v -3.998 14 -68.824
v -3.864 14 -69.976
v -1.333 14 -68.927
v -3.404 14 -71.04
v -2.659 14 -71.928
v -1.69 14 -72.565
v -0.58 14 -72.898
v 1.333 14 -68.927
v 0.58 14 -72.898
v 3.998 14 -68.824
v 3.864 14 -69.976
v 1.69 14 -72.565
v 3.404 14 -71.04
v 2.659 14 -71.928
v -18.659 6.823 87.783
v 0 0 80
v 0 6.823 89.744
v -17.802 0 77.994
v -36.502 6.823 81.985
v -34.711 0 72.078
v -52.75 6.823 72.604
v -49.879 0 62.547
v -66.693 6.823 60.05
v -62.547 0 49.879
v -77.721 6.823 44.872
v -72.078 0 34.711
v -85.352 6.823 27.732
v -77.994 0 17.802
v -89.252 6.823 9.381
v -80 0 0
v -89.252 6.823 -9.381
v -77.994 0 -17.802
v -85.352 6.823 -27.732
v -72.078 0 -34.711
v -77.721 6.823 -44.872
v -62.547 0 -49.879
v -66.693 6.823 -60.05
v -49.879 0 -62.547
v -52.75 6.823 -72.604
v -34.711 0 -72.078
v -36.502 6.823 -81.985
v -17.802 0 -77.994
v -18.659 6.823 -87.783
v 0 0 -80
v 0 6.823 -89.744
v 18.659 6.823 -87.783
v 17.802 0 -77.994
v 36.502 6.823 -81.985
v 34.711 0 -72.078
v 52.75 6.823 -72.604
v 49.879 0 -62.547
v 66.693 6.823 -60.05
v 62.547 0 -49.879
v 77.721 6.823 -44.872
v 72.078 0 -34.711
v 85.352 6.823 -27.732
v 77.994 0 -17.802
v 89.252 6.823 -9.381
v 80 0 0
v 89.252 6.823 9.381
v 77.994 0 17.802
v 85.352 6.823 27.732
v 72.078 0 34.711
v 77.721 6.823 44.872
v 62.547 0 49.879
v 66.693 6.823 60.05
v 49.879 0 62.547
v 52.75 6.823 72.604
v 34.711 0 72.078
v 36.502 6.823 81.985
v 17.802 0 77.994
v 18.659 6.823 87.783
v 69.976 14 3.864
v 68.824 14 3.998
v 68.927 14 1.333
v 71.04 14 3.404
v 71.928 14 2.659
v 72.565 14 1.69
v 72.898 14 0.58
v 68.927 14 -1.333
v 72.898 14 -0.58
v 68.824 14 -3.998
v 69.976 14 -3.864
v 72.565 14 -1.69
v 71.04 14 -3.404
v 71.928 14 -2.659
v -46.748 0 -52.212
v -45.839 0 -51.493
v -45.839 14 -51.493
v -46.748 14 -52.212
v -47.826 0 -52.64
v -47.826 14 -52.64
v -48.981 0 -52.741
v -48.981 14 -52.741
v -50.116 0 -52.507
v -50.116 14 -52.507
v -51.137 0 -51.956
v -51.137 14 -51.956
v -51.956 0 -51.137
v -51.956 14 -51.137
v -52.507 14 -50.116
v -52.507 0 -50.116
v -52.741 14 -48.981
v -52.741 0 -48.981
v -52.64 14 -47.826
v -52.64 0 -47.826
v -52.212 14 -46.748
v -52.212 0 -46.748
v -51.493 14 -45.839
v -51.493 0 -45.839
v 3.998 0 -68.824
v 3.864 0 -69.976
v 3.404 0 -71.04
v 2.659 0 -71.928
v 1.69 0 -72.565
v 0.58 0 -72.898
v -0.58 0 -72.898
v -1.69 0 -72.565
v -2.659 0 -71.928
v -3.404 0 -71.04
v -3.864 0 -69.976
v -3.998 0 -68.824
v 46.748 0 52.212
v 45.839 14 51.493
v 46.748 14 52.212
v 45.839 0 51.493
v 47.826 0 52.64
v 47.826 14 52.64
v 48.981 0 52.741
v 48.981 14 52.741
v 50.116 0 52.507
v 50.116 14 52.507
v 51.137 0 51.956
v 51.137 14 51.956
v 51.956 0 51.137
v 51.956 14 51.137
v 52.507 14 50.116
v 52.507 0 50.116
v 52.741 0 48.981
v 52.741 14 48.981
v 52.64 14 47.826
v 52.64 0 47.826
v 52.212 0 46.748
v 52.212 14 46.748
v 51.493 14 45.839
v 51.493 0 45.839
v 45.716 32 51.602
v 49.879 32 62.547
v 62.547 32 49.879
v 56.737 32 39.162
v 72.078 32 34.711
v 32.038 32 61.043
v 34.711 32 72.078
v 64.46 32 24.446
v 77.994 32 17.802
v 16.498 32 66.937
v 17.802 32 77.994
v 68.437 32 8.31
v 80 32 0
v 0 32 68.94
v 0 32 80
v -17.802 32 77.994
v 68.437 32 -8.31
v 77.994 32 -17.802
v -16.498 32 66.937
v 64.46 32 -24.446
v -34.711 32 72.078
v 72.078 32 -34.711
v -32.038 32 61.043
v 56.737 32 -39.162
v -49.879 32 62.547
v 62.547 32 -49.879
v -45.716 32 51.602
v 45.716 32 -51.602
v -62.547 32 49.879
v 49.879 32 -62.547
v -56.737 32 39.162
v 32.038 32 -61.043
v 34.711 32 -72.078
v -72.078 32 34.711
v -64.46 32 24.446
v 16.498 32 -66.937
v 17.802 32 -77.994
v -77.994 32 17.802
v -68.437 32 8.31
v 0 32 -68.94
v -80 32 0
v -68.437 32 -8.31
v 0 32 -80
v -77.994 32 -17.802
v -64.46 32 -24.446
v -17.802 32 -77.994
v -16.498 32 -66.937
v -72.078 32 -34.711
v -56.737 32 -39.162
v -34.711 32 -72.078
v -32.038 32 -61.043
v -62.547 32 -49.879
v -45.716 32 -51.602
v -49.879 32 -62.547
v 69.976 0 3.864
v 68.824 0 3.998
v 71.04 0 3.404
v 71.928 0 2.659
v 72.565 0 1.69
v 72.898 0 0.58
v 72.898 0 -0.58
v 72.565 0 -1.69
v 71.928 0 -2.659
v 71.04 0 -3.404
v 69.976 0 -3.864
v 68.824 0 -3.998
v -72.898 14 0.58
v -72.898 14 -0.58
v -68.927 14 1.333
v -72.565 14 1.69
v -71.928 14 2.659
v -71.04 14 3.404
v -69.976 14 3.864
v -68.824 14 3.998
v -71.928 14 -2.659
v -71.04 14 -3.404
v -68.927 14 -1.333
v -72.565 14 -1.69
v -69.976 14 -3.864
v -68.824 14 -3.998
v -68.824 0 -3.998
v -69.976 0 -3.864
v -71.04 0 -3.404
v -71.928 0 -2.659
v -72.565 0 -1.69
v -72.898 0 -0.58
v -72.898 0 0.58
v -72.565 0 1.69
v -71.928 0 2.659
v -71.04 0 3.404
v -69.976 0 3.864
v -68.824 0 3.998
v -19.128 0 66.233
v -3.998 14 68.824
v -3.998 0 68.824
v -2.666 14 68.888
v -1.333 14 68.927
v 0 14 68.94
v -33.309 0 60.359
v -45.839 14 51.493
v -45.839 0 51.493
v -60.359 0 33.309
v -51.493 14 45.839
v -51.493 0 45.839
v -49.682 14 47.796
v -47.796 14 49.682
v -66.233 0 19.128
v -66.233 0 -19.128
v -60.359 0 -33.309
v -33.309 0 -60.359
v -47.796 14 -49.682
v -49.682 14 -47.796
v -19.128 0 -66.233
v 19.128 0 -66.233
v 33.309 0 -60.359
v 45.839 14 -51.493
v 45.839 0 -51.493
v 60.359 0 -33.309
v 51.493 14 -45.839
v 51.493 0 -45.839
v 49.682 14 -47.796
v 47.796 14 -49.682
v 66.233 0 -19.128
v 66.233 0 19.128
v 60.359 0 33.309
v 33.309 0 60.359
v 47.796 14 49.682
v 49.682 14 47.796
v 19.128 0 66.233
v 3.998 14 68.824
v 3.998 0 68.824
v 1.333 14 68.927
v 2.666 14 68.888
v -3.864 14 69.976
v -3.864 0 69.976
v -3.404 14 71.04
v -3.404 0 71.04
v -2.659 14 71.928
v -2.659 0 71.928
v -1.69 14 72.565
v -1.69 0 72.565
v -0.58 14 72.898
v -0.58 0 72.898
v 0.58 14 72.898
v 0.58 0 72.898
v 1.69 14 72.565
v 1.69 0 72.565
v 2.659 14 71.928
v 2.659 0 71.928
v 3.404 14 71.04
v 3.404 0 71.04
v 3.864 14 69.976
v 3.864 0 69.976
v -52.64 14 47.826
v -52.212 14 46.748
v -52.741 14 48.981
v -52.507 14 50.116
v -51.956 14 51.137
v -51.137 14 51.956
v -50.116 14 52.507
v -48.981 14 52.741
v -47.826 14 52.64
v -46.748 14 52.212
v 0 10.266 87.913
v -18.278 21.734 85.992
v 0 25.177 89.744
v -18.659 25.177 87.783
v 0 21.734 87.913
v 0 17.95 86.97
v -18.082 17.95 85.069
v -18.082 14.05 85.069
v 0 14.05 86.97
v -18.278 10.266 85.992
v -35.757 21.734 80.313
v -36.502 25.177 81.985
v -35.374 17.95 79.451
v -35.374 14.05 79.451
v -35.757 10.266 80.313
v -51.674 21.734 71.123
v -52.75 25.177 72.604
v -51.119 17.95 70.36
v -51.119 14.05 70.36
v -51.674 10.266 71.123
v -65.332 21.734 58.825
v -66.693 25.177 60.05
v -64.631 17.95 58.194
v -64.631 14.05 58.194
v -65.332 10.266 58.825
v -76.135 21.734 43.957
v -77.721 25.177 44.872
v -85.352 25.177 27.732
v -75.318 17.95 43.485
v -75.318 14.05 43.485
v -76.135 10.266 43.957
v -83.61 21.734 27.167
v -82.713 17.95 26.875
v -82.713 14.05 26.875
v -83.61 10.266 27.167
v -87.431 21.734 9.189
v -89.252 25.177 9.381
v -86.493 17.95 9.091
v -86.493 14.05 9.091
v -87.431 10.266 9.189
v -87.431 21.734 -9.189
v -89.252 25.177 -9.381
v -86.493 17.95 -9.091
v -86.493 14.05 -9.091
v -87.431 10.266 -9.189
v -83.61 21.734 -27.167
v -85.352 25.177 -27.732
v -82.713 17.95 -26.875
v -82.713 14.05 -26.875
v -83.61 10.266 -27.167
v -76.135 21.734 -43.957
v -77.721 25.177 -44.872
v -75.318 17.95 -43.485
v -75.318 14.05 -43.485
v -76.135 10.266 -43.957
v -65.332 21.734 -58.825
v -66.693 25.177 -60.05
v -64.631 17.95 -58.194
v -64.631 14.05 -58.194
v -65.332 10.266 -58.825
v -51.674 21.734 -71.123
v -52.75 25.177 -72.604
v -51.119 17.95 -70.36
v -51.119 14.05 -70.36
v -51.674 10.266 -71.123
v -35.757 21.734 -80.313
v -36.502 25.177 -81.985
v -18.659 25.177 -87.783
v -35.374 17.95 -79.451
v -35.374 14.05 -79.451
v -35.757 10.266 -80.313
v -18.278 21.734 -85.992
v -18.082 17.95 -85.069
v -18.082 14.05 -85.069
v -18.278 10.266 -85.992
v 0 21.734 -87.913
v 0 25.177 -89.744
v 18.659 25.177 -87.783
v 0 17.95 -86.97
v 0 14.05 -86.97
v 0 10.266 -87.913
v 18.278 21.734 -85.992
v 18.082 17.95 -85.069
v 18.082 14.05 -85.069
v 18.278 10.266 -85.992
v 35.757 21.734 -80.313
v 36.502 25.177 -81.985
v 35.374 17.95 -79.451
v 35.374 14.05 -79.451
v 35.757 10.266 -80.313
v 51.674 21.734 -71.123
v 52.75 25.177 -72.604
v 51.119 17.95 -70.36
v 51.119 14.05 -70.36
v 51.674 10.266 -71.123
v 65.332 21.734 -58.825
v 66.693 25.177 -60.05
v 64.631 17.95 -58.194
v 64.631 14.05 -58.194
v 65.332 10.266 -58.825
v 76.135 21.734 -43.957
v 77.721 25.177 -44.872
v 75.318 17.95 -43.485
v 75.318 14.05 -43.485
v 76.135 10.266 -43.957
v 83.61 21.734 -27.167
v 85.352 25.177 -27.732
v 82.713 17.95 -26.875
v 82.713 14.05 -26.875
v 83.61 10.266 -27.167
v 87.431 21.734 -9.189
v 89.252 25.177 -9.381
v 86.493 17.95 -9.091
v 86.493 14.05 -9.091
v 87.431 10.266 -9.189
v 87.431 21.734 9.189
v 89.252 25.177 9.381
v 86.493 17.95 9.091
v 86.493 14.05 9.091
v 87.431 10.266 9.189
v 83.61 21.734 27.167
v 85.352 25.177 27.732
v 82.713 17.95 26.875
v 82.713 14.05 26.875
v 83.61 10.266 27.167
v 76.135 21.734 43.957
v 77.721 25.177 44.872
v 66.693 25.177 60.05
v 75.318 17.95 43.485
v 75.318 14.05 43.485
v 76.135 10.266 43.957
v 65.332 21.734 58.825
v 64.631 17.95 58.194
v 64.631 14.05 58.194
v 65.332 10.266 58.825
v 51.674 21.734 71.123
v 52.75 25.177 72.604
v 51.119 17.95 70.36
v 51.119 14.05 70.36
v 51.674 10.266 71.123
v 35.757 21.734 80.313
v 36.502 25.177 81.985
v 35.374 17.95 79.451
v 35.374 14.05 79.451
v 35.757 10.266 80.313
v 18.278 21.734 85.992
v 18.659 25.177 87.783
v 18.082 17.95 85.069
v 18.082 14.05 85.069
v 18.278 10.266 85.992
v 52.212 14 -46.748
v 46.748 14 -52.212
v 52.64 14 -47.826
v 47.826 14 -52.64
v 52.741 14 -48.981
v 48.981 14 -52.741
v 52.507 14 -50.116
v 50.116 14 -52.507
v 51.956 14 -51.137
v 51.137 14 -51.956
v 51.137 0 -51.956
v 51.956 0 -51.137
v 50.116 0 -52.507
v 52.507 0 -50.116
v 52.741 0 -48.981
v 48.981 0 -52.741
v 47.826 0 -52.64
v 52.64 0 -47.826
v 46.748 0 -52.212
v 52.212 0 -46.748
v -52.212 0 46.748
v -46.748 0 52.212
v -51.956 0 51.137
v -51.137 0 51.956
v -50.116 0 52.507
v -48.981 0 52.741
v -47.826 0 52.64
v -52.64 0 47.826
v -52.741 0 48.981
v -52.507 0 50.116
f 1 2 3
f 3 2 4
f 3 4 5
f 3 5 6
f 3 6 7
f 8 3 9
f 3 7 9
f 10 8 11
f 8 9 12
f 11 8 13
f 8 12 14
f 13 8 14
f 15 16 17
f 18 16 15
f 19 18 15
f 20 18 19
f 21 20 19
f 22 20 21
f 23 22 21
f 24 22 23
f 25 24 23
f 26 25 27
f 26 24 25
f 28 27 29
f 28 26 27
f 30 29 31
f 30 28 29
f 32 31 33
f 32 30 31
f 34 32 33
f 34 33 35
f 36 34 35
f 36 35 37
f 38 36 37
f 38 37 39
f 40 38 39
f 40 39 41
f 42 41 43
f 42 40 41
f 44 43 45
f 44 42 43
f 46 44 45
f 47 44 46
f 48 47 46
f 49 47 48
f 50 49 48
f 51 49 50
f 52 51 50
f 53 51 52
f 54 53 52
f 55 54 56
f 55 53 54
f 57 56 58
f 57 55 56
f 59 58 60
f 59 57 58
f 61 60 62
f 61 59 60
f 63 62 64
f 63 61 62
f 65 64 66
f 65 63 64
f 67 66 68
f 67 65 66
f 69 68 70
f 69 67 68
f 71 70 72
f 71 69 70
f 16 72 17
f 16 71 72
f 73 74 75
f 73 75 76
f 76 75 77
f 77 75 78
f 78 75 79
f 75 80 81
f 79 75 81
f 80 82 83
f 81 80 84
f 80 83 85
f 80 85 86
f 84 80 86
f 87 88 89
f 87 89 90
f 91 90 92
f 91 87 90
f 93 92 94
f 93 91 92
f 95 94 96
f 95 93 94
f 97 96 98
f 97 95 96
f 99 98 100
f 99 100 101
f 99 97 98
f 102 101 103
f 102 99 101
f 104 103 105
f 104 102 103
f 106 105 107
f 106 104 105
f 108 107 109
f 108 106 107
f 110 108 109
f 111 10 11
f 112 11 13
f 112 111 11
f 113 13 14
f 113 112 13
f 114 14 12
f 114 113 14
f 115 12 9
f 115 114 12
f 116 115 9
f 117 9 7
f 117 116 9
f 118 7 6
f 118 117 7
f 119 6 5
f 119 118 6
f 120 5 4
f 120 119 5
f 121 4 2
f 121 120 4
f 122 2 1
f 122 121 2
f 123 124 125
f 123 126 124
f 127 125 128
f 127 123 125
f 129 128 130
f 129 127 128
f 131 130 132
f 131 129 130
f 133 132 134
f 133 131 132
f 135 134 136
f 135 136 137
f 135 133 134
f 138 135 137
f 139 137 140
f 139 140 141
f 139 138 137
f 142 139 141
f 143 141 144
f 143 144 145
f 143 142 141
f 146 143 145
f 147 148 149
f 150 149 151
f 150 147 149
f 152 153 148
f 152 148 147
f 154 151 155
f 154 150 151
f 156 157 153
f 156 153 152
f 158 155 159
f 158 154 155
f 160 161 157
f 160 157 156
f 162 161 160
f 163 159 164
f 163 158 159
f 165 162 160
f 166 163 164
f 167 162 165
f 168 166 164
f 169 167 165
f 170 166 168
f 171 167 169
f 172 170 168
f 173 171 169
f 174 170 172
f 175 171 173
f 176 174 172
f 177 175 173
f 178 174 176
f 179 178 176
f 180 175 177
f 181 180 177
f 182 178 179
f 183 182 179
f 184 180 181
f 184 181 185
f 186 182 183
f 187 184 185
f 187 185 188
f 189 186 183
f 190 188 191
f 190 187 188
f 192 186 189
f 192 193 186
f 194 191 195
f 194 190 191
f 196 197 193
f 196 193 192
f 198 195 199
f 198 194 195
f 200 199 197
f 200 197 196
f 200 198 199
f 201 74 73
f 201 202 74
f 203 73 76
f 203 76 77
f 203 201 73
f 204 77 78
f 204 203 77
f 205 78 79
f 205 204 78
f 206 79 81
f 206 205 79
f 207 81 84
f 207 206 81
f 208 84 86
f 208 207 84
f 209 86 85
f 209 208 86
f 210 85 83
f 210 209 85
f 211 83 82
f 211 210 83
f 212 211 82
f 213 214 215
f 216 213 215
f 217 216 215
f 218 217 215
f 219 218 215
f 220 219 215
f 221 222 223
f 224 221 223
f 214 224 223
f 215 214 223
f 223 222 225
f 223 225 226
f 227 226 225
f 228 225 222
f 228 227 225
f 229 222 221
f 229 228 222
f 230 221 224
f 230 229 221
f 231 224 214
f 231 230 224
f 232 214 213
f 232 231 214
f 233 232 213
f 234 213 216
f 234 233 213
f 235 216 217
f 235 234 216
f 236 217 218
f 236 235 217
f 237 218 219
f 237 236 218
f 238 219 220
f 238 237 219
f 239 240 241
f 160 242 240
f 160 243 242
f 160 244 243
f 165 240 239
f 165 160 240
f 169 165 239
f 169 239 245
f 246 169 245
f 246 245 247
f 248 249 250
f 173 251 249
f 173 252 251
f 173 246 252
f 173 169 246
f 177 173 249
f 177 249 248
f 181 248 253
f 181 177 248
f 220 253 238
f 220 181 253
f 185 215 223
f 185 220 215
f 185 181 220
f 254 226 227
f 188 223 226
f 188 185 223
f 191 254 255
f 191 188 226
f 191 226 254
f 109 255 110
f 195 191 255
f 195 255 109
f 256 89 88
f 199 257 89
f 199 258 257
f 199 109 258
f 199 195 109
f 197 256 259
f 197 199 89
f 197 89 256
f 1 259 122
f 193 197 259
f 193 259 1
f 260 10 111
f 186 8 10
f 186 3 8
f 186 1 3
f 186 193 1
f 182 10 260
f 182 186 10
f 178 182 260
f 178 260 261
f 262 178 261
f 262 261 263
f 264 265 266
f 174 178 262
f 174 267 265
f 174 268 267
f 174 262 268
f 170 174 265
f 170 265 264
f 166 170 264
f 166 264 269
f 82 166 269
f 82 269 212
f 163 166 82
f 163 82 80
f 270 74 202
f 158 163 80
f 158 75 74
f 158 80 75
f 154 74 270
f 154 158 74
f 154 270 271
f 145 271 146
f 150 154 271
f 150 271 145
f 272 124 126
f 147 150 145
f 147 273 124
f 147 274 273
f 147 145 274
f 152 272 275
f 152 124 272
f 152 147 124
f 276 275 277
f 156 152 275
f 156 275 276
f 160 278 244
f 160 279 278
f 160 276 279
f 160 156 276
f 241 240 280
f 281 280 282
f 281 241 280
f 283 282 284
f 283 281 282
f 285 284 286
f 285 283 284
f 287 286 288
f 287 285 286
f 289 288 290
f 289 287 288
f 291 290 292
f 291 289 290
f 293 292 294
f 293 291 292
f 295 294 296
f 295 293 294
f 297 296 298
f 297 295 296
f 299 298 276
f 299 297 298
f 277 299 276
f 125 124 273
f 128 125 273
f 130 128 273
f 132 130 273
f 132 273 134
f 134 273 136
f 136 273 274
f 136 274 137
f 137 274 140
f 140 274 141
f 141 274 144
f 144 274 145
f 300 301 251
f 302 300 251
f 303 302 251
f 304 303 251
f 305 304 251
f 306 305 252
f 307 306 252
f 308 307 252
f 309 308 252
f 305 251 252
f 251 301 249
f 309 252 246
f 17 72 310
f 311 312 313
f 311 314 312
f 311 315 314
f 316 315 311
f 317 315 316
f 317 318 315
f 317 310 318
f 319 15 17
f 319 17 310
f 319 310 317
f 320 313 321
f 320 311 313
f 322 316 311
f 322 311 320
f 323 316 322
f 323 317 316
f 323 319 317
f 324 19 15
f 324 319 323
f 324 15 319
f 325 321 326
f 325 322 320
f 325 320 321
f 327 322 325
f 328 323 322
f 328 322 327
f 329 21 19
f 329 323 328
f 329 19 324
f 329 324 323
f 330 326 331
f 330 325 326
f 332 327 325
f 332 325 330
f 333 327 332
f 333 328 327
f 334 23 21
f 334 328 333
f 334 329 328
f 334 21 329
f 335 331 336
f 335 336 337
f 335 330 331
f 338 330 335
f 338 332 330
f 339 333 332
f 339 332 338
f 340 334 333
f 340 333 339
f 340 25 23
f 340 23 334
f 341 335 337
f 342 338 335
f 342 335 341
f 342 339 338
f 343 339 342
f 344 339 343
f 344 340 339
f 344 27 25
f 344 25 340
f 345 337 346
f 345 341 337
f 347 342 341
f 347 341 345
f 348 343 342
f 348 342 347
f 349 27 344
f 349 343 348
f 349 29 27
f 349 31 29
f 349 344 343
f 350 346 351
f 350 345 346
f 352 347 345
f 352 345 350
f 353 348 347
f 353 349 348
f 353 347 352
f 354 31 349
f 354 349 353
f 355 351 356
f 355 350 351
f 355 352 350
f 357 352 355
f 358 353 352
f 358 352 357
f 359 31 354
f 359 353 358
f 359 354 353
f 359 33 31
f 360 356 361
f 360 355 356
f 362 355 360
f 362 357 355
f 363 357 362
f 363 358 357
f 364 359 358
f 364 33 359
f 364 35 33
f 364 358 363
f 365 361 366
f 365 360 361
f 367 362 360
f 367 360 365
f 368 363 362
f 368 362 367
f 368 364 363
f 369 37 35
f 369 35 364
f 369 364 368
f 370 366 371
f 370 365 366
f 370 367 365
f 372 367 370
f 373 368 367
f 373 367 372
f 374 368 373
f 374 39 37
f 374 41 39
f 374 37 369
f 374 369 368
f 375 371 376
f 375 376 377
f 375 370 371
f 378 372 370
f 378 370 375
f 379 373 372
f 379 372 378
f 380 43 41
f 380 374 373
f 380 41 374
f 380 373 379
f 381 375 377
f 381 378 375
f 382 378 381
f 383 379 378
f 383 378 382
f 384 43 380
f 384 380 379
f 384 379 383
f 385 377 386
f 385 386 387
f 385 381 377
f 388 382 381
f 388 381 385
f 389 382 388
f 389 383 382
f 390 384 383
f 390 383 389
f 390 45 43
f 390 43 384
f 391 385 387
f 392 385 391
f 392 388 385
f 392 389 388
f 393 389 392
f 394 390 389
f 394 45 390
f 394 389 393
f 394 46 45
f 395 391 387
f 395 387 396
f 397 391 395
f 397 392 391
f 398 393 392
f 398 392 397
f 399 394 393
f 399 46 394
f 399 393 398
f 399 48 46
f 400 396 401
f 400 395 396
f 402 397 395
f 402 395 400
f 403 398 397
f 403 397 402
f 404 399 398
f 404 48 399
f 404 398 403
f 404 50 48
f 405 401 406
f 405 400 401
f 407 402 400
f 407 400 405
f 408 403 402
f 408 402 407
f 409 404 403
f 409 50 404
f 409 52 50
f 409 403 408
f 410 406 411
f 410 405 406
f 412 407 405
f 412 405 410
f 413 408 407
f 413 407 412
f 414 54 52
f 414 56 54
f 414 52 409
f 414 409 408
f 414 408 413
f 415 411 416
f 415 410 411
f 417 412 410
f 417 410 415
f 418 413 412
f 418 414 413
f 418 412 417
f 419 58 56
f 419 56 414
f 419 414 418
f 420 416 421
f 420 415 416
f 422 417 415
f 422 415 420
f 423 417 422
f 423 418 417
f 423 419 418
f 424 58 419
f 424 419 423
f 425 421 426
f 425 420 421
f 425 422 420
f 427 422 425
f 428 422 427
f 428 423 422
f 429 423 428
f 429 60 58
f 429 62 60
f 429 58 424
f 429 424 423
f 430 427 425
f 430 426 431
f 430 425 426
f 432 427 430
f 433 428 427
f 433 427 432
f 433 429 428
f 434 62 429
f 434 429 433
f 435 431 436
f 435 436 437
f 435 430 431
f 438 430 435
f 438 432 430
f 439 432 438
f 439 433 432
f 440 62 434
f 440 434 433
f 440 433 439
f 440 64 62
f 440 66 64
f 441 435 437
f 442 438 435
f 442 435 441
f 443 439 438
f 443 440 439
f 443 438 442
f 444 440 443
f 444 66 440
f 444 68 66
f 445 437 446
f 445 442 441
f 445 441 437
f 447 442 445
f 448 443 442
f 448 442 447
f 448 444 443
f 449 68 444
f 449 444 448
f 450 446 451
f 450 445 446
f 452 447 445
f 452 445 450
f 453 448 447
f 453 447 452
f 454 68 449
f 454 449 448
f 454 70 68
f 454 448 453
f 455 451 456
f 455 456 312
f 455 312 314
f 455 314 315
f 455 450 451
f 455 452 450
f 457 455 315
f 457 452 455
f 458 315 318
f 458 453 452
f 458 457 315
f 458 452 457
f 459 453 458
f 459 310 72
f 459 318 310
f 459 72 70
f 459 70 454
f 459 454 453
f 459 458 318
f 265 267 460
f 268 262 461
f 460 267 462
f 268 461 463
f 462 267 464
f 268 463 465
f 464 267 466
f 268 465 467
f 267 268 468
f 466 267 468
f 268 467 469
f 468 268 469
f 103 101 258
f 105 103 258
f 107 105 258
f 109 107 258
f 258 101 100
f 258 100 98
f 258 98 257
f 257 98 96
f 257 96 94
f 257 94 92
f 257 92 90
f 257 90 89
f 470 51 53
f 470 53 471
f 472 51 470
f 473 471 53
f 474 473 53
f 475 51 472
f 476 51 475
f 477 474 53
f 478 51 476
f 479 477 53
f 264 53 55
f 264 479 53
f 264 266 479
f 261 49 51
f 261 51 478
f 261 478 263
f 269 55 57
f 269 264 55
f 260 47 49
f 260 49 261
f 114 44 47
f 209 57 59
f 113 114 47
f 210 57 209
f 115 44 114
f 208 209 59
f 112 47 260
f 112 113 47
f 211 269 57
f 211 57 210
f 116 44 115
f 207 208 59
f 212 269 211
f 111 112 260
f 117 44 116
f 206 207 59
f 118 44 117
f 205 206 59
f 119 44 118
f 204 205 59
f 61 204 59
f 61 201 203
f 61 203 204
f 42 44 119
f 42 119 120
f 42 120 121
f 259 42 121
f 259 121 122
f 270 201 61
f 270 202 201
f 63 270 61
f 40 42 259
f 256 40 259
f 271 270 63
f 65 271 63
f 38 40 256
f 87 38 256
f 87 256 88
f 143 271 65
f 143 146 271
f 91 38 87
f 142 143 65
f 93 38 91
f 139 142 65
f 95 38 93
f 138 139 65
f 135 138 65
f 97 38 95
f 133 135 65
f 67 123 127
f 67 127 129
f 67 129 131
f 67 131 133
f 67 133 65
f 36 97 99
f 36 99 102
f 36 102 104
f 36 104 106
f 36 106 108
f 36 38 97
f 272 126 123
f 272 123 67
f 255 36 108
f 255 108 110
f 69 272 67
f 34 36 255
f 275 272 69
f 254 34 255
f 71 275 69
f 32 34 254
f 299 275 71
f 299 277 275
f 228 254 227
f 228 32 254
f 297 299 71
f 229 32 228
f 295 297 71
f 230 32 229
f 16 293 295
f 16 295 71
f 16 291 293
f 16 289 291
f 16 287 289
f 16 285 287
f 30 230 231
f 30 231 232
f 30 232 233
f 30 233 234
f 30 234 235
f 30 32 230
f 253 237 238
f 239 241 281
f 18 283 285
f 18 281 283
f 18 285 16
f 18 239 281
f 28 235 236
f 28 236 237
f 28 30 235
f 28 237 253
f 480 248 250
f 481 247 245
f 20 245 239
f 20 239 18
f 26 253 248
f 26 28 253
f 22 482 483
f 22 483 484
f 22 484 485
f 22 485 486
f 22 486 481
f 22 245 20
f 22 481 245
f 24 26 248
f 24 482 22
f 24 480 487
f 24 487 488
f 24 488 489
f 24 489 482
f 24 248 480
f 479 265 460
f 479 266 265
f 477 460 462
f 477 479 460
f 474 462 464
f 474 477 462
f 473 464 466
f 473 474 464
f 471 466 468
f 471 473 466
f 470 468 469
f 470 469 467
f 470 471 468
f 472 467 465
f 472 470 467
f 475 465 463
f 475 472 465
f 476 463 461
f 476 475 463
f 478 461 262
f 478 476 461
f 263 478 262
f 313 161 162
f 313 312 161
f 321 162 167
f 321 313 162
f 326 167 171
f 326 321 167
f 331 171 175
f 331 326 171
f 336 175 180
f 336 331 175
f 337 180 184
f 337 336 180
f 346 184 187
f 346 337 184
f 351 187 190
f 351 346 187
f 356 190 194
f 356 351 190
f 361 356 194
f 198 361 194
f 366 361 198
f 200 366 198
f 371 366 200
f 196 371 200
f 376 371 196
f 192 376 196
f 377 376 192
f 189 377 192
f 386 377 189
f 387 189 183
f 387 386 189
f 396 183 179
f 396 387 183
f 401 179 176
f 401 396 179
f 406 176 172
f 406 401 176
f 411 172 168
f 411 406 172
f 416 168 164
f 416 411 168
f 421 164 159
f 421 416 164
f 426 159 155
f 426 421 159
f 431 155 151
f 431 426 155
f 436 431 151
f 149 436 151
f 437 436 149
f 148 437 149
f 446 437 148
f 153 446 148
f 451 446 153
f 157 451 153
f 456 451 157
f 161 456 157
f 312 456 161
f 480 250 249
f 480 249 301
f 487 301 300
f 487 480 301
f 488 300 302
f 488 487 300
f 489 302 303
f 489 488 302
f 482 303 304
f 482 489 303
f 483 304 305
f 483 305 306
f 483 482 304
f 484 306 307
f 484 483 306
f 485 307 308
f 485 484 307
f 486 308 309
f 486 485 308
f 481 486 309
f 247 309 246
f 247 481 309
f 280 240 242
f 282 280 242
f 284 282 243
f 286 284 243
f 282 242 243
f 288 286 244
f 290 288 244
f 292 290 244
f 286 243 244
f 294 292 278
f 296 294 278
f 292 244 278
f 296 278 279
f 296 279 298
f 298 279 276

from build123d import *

# Parameters (mm, degrees)
SKETCH3_R          = 4
CUT_EXTRUDE1_DEPTH = 14


with BuildPart() as part:
    # Sketch2 → Revolve1 (revolve)
    with BuildSketch(Plane(origin=(0, 0, 0), x_dir=(0, 0, -1), z_dir=(1, 0, 0)), mode=Mode.PRIVATE) as revolve1_sk:
        with BuildLine():
            Line((68.94, 0), (68.94, 32))
            Line((68.94, 32), (80, 32))
            Line((80, 32), (89.743935399, 25.177222982))
            ThreePointArc((89.743935399, 25.177222982), (86.850368108, 16), (89.743935399, 6.822777018))
            Line((89.743935399, 6.822777018), (80, 0))
            Line((80, 0), (68.94, 0))
        make_face()
    revolve(revolve1_sk.sketch.rotate(Axis((0, 24.773264932, 0), (0, -1, 0)), 180), axis=Axis((0, 24.773264932, 0), (0, -1, 0)))

    # Sketch3 → Cut-Extrude1 (cut)
    with BuildSketch(Plane(origin=(0, 0, 0), x_dir=(1, 0, 0), z_dir=(0, 1, 0))):
        with Locations((0, 68.94)):
            Circle(SKETCH3_R)
        with Locations((48.747941495, 48.747941495)):
            Circle(SKETCH3_R)
        with Locations((68.94, 0)):
            Circle(SKETCH3_R)
        with Locations((48.747941495, -48.747941495)):
            Circle(SKETCH3_R)
        with Locations((0, -68.94)):
            Circle(SKETCH3_R)
        with Locations((-48.747941495, -48.747941495)):
            Circle(SKETCH3_R)
        with Locations((-68.94, 0)):
            Circle(SKETCH3_R)
        with Locations((-48.747941495, 48.747941495)):
            Circle(SKETCH3_R)
    extrude(amount=CUT_EXTRUDE1_DEPTH, mode=Mode.SUBTRACT)


solid = part.part
